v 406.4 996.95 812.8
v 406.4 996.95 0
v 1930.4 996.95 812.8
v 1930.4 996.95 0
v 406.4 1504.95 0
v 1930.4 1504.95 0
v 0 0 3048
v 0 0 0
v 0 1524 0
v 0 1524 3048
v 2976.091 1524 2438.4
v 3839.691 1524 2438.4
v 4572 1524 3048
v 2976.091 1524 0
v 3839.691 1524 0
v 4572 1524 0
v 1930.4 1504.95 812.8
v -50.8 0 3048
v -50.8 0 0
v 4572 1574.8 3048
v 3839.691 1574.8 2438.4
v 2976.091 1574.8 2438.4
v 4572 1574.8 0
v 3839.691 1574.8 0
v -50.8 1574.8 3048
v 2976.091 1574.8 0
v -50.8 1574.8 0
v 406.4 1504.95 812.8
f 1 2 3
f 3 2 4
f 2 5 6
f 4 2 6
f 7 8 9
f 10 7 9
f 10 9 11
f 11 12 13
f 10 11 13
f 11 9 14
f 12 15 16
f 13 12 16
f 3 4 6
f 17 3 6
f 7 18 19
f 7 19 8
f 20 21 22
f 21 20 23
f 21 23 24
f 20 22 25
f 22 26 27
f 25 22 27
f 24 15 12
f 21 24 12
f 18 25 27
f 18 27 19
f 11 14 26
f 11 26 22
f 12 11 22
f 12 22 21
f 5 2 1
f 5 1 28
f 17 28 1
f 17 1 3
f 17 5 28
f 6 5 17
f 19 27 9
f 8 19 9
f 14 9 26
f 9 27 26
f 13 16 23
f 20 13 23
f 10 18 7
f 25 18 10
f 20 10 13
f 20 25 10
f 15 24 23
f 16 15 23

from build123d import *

# Parameters (mm, degrees)
F1_DEPTH = 3048
F2_W     = 1524
F2_H     = 508
F3_DEPTH = 812.8
F4_W     = 863.6
F4_H     = 2438.4
F5_DEPTH = 50.8


with BuildPart() as f1:
    # F0 (on Top) → F1 (new body)
    with BuildSketch(Plane.XY):
        Polygon((-50.8, 0), (0, 0), (0, 1524), (4572, 1524), (4572, 1574.8), (-50.8, 1574.8), align=None)
    extrude(amount=F1_DEPTH)

    # F4 (on face) → F5 (cut)
    with BuildSketch(Plane.XZ.offset(-1524)):
        with Locations((3407.89067, 1219.2)):
            Rectangle(F4_W, F4_H)
    extrude(amount=-F5_DEPTH, mode=Mode.SUBTRACT)


with BuildPart() as f3:
    # F2 (on Top) → F3 (new body)
    with BuildSketch(Plane.XY):
        with Locations((1168.4, 1250.95)):
            Rectangle(F2_W, F2_H)
    extrude(amount=F3_DEPTH)


solid = Compound([f1.part, f3.part])
